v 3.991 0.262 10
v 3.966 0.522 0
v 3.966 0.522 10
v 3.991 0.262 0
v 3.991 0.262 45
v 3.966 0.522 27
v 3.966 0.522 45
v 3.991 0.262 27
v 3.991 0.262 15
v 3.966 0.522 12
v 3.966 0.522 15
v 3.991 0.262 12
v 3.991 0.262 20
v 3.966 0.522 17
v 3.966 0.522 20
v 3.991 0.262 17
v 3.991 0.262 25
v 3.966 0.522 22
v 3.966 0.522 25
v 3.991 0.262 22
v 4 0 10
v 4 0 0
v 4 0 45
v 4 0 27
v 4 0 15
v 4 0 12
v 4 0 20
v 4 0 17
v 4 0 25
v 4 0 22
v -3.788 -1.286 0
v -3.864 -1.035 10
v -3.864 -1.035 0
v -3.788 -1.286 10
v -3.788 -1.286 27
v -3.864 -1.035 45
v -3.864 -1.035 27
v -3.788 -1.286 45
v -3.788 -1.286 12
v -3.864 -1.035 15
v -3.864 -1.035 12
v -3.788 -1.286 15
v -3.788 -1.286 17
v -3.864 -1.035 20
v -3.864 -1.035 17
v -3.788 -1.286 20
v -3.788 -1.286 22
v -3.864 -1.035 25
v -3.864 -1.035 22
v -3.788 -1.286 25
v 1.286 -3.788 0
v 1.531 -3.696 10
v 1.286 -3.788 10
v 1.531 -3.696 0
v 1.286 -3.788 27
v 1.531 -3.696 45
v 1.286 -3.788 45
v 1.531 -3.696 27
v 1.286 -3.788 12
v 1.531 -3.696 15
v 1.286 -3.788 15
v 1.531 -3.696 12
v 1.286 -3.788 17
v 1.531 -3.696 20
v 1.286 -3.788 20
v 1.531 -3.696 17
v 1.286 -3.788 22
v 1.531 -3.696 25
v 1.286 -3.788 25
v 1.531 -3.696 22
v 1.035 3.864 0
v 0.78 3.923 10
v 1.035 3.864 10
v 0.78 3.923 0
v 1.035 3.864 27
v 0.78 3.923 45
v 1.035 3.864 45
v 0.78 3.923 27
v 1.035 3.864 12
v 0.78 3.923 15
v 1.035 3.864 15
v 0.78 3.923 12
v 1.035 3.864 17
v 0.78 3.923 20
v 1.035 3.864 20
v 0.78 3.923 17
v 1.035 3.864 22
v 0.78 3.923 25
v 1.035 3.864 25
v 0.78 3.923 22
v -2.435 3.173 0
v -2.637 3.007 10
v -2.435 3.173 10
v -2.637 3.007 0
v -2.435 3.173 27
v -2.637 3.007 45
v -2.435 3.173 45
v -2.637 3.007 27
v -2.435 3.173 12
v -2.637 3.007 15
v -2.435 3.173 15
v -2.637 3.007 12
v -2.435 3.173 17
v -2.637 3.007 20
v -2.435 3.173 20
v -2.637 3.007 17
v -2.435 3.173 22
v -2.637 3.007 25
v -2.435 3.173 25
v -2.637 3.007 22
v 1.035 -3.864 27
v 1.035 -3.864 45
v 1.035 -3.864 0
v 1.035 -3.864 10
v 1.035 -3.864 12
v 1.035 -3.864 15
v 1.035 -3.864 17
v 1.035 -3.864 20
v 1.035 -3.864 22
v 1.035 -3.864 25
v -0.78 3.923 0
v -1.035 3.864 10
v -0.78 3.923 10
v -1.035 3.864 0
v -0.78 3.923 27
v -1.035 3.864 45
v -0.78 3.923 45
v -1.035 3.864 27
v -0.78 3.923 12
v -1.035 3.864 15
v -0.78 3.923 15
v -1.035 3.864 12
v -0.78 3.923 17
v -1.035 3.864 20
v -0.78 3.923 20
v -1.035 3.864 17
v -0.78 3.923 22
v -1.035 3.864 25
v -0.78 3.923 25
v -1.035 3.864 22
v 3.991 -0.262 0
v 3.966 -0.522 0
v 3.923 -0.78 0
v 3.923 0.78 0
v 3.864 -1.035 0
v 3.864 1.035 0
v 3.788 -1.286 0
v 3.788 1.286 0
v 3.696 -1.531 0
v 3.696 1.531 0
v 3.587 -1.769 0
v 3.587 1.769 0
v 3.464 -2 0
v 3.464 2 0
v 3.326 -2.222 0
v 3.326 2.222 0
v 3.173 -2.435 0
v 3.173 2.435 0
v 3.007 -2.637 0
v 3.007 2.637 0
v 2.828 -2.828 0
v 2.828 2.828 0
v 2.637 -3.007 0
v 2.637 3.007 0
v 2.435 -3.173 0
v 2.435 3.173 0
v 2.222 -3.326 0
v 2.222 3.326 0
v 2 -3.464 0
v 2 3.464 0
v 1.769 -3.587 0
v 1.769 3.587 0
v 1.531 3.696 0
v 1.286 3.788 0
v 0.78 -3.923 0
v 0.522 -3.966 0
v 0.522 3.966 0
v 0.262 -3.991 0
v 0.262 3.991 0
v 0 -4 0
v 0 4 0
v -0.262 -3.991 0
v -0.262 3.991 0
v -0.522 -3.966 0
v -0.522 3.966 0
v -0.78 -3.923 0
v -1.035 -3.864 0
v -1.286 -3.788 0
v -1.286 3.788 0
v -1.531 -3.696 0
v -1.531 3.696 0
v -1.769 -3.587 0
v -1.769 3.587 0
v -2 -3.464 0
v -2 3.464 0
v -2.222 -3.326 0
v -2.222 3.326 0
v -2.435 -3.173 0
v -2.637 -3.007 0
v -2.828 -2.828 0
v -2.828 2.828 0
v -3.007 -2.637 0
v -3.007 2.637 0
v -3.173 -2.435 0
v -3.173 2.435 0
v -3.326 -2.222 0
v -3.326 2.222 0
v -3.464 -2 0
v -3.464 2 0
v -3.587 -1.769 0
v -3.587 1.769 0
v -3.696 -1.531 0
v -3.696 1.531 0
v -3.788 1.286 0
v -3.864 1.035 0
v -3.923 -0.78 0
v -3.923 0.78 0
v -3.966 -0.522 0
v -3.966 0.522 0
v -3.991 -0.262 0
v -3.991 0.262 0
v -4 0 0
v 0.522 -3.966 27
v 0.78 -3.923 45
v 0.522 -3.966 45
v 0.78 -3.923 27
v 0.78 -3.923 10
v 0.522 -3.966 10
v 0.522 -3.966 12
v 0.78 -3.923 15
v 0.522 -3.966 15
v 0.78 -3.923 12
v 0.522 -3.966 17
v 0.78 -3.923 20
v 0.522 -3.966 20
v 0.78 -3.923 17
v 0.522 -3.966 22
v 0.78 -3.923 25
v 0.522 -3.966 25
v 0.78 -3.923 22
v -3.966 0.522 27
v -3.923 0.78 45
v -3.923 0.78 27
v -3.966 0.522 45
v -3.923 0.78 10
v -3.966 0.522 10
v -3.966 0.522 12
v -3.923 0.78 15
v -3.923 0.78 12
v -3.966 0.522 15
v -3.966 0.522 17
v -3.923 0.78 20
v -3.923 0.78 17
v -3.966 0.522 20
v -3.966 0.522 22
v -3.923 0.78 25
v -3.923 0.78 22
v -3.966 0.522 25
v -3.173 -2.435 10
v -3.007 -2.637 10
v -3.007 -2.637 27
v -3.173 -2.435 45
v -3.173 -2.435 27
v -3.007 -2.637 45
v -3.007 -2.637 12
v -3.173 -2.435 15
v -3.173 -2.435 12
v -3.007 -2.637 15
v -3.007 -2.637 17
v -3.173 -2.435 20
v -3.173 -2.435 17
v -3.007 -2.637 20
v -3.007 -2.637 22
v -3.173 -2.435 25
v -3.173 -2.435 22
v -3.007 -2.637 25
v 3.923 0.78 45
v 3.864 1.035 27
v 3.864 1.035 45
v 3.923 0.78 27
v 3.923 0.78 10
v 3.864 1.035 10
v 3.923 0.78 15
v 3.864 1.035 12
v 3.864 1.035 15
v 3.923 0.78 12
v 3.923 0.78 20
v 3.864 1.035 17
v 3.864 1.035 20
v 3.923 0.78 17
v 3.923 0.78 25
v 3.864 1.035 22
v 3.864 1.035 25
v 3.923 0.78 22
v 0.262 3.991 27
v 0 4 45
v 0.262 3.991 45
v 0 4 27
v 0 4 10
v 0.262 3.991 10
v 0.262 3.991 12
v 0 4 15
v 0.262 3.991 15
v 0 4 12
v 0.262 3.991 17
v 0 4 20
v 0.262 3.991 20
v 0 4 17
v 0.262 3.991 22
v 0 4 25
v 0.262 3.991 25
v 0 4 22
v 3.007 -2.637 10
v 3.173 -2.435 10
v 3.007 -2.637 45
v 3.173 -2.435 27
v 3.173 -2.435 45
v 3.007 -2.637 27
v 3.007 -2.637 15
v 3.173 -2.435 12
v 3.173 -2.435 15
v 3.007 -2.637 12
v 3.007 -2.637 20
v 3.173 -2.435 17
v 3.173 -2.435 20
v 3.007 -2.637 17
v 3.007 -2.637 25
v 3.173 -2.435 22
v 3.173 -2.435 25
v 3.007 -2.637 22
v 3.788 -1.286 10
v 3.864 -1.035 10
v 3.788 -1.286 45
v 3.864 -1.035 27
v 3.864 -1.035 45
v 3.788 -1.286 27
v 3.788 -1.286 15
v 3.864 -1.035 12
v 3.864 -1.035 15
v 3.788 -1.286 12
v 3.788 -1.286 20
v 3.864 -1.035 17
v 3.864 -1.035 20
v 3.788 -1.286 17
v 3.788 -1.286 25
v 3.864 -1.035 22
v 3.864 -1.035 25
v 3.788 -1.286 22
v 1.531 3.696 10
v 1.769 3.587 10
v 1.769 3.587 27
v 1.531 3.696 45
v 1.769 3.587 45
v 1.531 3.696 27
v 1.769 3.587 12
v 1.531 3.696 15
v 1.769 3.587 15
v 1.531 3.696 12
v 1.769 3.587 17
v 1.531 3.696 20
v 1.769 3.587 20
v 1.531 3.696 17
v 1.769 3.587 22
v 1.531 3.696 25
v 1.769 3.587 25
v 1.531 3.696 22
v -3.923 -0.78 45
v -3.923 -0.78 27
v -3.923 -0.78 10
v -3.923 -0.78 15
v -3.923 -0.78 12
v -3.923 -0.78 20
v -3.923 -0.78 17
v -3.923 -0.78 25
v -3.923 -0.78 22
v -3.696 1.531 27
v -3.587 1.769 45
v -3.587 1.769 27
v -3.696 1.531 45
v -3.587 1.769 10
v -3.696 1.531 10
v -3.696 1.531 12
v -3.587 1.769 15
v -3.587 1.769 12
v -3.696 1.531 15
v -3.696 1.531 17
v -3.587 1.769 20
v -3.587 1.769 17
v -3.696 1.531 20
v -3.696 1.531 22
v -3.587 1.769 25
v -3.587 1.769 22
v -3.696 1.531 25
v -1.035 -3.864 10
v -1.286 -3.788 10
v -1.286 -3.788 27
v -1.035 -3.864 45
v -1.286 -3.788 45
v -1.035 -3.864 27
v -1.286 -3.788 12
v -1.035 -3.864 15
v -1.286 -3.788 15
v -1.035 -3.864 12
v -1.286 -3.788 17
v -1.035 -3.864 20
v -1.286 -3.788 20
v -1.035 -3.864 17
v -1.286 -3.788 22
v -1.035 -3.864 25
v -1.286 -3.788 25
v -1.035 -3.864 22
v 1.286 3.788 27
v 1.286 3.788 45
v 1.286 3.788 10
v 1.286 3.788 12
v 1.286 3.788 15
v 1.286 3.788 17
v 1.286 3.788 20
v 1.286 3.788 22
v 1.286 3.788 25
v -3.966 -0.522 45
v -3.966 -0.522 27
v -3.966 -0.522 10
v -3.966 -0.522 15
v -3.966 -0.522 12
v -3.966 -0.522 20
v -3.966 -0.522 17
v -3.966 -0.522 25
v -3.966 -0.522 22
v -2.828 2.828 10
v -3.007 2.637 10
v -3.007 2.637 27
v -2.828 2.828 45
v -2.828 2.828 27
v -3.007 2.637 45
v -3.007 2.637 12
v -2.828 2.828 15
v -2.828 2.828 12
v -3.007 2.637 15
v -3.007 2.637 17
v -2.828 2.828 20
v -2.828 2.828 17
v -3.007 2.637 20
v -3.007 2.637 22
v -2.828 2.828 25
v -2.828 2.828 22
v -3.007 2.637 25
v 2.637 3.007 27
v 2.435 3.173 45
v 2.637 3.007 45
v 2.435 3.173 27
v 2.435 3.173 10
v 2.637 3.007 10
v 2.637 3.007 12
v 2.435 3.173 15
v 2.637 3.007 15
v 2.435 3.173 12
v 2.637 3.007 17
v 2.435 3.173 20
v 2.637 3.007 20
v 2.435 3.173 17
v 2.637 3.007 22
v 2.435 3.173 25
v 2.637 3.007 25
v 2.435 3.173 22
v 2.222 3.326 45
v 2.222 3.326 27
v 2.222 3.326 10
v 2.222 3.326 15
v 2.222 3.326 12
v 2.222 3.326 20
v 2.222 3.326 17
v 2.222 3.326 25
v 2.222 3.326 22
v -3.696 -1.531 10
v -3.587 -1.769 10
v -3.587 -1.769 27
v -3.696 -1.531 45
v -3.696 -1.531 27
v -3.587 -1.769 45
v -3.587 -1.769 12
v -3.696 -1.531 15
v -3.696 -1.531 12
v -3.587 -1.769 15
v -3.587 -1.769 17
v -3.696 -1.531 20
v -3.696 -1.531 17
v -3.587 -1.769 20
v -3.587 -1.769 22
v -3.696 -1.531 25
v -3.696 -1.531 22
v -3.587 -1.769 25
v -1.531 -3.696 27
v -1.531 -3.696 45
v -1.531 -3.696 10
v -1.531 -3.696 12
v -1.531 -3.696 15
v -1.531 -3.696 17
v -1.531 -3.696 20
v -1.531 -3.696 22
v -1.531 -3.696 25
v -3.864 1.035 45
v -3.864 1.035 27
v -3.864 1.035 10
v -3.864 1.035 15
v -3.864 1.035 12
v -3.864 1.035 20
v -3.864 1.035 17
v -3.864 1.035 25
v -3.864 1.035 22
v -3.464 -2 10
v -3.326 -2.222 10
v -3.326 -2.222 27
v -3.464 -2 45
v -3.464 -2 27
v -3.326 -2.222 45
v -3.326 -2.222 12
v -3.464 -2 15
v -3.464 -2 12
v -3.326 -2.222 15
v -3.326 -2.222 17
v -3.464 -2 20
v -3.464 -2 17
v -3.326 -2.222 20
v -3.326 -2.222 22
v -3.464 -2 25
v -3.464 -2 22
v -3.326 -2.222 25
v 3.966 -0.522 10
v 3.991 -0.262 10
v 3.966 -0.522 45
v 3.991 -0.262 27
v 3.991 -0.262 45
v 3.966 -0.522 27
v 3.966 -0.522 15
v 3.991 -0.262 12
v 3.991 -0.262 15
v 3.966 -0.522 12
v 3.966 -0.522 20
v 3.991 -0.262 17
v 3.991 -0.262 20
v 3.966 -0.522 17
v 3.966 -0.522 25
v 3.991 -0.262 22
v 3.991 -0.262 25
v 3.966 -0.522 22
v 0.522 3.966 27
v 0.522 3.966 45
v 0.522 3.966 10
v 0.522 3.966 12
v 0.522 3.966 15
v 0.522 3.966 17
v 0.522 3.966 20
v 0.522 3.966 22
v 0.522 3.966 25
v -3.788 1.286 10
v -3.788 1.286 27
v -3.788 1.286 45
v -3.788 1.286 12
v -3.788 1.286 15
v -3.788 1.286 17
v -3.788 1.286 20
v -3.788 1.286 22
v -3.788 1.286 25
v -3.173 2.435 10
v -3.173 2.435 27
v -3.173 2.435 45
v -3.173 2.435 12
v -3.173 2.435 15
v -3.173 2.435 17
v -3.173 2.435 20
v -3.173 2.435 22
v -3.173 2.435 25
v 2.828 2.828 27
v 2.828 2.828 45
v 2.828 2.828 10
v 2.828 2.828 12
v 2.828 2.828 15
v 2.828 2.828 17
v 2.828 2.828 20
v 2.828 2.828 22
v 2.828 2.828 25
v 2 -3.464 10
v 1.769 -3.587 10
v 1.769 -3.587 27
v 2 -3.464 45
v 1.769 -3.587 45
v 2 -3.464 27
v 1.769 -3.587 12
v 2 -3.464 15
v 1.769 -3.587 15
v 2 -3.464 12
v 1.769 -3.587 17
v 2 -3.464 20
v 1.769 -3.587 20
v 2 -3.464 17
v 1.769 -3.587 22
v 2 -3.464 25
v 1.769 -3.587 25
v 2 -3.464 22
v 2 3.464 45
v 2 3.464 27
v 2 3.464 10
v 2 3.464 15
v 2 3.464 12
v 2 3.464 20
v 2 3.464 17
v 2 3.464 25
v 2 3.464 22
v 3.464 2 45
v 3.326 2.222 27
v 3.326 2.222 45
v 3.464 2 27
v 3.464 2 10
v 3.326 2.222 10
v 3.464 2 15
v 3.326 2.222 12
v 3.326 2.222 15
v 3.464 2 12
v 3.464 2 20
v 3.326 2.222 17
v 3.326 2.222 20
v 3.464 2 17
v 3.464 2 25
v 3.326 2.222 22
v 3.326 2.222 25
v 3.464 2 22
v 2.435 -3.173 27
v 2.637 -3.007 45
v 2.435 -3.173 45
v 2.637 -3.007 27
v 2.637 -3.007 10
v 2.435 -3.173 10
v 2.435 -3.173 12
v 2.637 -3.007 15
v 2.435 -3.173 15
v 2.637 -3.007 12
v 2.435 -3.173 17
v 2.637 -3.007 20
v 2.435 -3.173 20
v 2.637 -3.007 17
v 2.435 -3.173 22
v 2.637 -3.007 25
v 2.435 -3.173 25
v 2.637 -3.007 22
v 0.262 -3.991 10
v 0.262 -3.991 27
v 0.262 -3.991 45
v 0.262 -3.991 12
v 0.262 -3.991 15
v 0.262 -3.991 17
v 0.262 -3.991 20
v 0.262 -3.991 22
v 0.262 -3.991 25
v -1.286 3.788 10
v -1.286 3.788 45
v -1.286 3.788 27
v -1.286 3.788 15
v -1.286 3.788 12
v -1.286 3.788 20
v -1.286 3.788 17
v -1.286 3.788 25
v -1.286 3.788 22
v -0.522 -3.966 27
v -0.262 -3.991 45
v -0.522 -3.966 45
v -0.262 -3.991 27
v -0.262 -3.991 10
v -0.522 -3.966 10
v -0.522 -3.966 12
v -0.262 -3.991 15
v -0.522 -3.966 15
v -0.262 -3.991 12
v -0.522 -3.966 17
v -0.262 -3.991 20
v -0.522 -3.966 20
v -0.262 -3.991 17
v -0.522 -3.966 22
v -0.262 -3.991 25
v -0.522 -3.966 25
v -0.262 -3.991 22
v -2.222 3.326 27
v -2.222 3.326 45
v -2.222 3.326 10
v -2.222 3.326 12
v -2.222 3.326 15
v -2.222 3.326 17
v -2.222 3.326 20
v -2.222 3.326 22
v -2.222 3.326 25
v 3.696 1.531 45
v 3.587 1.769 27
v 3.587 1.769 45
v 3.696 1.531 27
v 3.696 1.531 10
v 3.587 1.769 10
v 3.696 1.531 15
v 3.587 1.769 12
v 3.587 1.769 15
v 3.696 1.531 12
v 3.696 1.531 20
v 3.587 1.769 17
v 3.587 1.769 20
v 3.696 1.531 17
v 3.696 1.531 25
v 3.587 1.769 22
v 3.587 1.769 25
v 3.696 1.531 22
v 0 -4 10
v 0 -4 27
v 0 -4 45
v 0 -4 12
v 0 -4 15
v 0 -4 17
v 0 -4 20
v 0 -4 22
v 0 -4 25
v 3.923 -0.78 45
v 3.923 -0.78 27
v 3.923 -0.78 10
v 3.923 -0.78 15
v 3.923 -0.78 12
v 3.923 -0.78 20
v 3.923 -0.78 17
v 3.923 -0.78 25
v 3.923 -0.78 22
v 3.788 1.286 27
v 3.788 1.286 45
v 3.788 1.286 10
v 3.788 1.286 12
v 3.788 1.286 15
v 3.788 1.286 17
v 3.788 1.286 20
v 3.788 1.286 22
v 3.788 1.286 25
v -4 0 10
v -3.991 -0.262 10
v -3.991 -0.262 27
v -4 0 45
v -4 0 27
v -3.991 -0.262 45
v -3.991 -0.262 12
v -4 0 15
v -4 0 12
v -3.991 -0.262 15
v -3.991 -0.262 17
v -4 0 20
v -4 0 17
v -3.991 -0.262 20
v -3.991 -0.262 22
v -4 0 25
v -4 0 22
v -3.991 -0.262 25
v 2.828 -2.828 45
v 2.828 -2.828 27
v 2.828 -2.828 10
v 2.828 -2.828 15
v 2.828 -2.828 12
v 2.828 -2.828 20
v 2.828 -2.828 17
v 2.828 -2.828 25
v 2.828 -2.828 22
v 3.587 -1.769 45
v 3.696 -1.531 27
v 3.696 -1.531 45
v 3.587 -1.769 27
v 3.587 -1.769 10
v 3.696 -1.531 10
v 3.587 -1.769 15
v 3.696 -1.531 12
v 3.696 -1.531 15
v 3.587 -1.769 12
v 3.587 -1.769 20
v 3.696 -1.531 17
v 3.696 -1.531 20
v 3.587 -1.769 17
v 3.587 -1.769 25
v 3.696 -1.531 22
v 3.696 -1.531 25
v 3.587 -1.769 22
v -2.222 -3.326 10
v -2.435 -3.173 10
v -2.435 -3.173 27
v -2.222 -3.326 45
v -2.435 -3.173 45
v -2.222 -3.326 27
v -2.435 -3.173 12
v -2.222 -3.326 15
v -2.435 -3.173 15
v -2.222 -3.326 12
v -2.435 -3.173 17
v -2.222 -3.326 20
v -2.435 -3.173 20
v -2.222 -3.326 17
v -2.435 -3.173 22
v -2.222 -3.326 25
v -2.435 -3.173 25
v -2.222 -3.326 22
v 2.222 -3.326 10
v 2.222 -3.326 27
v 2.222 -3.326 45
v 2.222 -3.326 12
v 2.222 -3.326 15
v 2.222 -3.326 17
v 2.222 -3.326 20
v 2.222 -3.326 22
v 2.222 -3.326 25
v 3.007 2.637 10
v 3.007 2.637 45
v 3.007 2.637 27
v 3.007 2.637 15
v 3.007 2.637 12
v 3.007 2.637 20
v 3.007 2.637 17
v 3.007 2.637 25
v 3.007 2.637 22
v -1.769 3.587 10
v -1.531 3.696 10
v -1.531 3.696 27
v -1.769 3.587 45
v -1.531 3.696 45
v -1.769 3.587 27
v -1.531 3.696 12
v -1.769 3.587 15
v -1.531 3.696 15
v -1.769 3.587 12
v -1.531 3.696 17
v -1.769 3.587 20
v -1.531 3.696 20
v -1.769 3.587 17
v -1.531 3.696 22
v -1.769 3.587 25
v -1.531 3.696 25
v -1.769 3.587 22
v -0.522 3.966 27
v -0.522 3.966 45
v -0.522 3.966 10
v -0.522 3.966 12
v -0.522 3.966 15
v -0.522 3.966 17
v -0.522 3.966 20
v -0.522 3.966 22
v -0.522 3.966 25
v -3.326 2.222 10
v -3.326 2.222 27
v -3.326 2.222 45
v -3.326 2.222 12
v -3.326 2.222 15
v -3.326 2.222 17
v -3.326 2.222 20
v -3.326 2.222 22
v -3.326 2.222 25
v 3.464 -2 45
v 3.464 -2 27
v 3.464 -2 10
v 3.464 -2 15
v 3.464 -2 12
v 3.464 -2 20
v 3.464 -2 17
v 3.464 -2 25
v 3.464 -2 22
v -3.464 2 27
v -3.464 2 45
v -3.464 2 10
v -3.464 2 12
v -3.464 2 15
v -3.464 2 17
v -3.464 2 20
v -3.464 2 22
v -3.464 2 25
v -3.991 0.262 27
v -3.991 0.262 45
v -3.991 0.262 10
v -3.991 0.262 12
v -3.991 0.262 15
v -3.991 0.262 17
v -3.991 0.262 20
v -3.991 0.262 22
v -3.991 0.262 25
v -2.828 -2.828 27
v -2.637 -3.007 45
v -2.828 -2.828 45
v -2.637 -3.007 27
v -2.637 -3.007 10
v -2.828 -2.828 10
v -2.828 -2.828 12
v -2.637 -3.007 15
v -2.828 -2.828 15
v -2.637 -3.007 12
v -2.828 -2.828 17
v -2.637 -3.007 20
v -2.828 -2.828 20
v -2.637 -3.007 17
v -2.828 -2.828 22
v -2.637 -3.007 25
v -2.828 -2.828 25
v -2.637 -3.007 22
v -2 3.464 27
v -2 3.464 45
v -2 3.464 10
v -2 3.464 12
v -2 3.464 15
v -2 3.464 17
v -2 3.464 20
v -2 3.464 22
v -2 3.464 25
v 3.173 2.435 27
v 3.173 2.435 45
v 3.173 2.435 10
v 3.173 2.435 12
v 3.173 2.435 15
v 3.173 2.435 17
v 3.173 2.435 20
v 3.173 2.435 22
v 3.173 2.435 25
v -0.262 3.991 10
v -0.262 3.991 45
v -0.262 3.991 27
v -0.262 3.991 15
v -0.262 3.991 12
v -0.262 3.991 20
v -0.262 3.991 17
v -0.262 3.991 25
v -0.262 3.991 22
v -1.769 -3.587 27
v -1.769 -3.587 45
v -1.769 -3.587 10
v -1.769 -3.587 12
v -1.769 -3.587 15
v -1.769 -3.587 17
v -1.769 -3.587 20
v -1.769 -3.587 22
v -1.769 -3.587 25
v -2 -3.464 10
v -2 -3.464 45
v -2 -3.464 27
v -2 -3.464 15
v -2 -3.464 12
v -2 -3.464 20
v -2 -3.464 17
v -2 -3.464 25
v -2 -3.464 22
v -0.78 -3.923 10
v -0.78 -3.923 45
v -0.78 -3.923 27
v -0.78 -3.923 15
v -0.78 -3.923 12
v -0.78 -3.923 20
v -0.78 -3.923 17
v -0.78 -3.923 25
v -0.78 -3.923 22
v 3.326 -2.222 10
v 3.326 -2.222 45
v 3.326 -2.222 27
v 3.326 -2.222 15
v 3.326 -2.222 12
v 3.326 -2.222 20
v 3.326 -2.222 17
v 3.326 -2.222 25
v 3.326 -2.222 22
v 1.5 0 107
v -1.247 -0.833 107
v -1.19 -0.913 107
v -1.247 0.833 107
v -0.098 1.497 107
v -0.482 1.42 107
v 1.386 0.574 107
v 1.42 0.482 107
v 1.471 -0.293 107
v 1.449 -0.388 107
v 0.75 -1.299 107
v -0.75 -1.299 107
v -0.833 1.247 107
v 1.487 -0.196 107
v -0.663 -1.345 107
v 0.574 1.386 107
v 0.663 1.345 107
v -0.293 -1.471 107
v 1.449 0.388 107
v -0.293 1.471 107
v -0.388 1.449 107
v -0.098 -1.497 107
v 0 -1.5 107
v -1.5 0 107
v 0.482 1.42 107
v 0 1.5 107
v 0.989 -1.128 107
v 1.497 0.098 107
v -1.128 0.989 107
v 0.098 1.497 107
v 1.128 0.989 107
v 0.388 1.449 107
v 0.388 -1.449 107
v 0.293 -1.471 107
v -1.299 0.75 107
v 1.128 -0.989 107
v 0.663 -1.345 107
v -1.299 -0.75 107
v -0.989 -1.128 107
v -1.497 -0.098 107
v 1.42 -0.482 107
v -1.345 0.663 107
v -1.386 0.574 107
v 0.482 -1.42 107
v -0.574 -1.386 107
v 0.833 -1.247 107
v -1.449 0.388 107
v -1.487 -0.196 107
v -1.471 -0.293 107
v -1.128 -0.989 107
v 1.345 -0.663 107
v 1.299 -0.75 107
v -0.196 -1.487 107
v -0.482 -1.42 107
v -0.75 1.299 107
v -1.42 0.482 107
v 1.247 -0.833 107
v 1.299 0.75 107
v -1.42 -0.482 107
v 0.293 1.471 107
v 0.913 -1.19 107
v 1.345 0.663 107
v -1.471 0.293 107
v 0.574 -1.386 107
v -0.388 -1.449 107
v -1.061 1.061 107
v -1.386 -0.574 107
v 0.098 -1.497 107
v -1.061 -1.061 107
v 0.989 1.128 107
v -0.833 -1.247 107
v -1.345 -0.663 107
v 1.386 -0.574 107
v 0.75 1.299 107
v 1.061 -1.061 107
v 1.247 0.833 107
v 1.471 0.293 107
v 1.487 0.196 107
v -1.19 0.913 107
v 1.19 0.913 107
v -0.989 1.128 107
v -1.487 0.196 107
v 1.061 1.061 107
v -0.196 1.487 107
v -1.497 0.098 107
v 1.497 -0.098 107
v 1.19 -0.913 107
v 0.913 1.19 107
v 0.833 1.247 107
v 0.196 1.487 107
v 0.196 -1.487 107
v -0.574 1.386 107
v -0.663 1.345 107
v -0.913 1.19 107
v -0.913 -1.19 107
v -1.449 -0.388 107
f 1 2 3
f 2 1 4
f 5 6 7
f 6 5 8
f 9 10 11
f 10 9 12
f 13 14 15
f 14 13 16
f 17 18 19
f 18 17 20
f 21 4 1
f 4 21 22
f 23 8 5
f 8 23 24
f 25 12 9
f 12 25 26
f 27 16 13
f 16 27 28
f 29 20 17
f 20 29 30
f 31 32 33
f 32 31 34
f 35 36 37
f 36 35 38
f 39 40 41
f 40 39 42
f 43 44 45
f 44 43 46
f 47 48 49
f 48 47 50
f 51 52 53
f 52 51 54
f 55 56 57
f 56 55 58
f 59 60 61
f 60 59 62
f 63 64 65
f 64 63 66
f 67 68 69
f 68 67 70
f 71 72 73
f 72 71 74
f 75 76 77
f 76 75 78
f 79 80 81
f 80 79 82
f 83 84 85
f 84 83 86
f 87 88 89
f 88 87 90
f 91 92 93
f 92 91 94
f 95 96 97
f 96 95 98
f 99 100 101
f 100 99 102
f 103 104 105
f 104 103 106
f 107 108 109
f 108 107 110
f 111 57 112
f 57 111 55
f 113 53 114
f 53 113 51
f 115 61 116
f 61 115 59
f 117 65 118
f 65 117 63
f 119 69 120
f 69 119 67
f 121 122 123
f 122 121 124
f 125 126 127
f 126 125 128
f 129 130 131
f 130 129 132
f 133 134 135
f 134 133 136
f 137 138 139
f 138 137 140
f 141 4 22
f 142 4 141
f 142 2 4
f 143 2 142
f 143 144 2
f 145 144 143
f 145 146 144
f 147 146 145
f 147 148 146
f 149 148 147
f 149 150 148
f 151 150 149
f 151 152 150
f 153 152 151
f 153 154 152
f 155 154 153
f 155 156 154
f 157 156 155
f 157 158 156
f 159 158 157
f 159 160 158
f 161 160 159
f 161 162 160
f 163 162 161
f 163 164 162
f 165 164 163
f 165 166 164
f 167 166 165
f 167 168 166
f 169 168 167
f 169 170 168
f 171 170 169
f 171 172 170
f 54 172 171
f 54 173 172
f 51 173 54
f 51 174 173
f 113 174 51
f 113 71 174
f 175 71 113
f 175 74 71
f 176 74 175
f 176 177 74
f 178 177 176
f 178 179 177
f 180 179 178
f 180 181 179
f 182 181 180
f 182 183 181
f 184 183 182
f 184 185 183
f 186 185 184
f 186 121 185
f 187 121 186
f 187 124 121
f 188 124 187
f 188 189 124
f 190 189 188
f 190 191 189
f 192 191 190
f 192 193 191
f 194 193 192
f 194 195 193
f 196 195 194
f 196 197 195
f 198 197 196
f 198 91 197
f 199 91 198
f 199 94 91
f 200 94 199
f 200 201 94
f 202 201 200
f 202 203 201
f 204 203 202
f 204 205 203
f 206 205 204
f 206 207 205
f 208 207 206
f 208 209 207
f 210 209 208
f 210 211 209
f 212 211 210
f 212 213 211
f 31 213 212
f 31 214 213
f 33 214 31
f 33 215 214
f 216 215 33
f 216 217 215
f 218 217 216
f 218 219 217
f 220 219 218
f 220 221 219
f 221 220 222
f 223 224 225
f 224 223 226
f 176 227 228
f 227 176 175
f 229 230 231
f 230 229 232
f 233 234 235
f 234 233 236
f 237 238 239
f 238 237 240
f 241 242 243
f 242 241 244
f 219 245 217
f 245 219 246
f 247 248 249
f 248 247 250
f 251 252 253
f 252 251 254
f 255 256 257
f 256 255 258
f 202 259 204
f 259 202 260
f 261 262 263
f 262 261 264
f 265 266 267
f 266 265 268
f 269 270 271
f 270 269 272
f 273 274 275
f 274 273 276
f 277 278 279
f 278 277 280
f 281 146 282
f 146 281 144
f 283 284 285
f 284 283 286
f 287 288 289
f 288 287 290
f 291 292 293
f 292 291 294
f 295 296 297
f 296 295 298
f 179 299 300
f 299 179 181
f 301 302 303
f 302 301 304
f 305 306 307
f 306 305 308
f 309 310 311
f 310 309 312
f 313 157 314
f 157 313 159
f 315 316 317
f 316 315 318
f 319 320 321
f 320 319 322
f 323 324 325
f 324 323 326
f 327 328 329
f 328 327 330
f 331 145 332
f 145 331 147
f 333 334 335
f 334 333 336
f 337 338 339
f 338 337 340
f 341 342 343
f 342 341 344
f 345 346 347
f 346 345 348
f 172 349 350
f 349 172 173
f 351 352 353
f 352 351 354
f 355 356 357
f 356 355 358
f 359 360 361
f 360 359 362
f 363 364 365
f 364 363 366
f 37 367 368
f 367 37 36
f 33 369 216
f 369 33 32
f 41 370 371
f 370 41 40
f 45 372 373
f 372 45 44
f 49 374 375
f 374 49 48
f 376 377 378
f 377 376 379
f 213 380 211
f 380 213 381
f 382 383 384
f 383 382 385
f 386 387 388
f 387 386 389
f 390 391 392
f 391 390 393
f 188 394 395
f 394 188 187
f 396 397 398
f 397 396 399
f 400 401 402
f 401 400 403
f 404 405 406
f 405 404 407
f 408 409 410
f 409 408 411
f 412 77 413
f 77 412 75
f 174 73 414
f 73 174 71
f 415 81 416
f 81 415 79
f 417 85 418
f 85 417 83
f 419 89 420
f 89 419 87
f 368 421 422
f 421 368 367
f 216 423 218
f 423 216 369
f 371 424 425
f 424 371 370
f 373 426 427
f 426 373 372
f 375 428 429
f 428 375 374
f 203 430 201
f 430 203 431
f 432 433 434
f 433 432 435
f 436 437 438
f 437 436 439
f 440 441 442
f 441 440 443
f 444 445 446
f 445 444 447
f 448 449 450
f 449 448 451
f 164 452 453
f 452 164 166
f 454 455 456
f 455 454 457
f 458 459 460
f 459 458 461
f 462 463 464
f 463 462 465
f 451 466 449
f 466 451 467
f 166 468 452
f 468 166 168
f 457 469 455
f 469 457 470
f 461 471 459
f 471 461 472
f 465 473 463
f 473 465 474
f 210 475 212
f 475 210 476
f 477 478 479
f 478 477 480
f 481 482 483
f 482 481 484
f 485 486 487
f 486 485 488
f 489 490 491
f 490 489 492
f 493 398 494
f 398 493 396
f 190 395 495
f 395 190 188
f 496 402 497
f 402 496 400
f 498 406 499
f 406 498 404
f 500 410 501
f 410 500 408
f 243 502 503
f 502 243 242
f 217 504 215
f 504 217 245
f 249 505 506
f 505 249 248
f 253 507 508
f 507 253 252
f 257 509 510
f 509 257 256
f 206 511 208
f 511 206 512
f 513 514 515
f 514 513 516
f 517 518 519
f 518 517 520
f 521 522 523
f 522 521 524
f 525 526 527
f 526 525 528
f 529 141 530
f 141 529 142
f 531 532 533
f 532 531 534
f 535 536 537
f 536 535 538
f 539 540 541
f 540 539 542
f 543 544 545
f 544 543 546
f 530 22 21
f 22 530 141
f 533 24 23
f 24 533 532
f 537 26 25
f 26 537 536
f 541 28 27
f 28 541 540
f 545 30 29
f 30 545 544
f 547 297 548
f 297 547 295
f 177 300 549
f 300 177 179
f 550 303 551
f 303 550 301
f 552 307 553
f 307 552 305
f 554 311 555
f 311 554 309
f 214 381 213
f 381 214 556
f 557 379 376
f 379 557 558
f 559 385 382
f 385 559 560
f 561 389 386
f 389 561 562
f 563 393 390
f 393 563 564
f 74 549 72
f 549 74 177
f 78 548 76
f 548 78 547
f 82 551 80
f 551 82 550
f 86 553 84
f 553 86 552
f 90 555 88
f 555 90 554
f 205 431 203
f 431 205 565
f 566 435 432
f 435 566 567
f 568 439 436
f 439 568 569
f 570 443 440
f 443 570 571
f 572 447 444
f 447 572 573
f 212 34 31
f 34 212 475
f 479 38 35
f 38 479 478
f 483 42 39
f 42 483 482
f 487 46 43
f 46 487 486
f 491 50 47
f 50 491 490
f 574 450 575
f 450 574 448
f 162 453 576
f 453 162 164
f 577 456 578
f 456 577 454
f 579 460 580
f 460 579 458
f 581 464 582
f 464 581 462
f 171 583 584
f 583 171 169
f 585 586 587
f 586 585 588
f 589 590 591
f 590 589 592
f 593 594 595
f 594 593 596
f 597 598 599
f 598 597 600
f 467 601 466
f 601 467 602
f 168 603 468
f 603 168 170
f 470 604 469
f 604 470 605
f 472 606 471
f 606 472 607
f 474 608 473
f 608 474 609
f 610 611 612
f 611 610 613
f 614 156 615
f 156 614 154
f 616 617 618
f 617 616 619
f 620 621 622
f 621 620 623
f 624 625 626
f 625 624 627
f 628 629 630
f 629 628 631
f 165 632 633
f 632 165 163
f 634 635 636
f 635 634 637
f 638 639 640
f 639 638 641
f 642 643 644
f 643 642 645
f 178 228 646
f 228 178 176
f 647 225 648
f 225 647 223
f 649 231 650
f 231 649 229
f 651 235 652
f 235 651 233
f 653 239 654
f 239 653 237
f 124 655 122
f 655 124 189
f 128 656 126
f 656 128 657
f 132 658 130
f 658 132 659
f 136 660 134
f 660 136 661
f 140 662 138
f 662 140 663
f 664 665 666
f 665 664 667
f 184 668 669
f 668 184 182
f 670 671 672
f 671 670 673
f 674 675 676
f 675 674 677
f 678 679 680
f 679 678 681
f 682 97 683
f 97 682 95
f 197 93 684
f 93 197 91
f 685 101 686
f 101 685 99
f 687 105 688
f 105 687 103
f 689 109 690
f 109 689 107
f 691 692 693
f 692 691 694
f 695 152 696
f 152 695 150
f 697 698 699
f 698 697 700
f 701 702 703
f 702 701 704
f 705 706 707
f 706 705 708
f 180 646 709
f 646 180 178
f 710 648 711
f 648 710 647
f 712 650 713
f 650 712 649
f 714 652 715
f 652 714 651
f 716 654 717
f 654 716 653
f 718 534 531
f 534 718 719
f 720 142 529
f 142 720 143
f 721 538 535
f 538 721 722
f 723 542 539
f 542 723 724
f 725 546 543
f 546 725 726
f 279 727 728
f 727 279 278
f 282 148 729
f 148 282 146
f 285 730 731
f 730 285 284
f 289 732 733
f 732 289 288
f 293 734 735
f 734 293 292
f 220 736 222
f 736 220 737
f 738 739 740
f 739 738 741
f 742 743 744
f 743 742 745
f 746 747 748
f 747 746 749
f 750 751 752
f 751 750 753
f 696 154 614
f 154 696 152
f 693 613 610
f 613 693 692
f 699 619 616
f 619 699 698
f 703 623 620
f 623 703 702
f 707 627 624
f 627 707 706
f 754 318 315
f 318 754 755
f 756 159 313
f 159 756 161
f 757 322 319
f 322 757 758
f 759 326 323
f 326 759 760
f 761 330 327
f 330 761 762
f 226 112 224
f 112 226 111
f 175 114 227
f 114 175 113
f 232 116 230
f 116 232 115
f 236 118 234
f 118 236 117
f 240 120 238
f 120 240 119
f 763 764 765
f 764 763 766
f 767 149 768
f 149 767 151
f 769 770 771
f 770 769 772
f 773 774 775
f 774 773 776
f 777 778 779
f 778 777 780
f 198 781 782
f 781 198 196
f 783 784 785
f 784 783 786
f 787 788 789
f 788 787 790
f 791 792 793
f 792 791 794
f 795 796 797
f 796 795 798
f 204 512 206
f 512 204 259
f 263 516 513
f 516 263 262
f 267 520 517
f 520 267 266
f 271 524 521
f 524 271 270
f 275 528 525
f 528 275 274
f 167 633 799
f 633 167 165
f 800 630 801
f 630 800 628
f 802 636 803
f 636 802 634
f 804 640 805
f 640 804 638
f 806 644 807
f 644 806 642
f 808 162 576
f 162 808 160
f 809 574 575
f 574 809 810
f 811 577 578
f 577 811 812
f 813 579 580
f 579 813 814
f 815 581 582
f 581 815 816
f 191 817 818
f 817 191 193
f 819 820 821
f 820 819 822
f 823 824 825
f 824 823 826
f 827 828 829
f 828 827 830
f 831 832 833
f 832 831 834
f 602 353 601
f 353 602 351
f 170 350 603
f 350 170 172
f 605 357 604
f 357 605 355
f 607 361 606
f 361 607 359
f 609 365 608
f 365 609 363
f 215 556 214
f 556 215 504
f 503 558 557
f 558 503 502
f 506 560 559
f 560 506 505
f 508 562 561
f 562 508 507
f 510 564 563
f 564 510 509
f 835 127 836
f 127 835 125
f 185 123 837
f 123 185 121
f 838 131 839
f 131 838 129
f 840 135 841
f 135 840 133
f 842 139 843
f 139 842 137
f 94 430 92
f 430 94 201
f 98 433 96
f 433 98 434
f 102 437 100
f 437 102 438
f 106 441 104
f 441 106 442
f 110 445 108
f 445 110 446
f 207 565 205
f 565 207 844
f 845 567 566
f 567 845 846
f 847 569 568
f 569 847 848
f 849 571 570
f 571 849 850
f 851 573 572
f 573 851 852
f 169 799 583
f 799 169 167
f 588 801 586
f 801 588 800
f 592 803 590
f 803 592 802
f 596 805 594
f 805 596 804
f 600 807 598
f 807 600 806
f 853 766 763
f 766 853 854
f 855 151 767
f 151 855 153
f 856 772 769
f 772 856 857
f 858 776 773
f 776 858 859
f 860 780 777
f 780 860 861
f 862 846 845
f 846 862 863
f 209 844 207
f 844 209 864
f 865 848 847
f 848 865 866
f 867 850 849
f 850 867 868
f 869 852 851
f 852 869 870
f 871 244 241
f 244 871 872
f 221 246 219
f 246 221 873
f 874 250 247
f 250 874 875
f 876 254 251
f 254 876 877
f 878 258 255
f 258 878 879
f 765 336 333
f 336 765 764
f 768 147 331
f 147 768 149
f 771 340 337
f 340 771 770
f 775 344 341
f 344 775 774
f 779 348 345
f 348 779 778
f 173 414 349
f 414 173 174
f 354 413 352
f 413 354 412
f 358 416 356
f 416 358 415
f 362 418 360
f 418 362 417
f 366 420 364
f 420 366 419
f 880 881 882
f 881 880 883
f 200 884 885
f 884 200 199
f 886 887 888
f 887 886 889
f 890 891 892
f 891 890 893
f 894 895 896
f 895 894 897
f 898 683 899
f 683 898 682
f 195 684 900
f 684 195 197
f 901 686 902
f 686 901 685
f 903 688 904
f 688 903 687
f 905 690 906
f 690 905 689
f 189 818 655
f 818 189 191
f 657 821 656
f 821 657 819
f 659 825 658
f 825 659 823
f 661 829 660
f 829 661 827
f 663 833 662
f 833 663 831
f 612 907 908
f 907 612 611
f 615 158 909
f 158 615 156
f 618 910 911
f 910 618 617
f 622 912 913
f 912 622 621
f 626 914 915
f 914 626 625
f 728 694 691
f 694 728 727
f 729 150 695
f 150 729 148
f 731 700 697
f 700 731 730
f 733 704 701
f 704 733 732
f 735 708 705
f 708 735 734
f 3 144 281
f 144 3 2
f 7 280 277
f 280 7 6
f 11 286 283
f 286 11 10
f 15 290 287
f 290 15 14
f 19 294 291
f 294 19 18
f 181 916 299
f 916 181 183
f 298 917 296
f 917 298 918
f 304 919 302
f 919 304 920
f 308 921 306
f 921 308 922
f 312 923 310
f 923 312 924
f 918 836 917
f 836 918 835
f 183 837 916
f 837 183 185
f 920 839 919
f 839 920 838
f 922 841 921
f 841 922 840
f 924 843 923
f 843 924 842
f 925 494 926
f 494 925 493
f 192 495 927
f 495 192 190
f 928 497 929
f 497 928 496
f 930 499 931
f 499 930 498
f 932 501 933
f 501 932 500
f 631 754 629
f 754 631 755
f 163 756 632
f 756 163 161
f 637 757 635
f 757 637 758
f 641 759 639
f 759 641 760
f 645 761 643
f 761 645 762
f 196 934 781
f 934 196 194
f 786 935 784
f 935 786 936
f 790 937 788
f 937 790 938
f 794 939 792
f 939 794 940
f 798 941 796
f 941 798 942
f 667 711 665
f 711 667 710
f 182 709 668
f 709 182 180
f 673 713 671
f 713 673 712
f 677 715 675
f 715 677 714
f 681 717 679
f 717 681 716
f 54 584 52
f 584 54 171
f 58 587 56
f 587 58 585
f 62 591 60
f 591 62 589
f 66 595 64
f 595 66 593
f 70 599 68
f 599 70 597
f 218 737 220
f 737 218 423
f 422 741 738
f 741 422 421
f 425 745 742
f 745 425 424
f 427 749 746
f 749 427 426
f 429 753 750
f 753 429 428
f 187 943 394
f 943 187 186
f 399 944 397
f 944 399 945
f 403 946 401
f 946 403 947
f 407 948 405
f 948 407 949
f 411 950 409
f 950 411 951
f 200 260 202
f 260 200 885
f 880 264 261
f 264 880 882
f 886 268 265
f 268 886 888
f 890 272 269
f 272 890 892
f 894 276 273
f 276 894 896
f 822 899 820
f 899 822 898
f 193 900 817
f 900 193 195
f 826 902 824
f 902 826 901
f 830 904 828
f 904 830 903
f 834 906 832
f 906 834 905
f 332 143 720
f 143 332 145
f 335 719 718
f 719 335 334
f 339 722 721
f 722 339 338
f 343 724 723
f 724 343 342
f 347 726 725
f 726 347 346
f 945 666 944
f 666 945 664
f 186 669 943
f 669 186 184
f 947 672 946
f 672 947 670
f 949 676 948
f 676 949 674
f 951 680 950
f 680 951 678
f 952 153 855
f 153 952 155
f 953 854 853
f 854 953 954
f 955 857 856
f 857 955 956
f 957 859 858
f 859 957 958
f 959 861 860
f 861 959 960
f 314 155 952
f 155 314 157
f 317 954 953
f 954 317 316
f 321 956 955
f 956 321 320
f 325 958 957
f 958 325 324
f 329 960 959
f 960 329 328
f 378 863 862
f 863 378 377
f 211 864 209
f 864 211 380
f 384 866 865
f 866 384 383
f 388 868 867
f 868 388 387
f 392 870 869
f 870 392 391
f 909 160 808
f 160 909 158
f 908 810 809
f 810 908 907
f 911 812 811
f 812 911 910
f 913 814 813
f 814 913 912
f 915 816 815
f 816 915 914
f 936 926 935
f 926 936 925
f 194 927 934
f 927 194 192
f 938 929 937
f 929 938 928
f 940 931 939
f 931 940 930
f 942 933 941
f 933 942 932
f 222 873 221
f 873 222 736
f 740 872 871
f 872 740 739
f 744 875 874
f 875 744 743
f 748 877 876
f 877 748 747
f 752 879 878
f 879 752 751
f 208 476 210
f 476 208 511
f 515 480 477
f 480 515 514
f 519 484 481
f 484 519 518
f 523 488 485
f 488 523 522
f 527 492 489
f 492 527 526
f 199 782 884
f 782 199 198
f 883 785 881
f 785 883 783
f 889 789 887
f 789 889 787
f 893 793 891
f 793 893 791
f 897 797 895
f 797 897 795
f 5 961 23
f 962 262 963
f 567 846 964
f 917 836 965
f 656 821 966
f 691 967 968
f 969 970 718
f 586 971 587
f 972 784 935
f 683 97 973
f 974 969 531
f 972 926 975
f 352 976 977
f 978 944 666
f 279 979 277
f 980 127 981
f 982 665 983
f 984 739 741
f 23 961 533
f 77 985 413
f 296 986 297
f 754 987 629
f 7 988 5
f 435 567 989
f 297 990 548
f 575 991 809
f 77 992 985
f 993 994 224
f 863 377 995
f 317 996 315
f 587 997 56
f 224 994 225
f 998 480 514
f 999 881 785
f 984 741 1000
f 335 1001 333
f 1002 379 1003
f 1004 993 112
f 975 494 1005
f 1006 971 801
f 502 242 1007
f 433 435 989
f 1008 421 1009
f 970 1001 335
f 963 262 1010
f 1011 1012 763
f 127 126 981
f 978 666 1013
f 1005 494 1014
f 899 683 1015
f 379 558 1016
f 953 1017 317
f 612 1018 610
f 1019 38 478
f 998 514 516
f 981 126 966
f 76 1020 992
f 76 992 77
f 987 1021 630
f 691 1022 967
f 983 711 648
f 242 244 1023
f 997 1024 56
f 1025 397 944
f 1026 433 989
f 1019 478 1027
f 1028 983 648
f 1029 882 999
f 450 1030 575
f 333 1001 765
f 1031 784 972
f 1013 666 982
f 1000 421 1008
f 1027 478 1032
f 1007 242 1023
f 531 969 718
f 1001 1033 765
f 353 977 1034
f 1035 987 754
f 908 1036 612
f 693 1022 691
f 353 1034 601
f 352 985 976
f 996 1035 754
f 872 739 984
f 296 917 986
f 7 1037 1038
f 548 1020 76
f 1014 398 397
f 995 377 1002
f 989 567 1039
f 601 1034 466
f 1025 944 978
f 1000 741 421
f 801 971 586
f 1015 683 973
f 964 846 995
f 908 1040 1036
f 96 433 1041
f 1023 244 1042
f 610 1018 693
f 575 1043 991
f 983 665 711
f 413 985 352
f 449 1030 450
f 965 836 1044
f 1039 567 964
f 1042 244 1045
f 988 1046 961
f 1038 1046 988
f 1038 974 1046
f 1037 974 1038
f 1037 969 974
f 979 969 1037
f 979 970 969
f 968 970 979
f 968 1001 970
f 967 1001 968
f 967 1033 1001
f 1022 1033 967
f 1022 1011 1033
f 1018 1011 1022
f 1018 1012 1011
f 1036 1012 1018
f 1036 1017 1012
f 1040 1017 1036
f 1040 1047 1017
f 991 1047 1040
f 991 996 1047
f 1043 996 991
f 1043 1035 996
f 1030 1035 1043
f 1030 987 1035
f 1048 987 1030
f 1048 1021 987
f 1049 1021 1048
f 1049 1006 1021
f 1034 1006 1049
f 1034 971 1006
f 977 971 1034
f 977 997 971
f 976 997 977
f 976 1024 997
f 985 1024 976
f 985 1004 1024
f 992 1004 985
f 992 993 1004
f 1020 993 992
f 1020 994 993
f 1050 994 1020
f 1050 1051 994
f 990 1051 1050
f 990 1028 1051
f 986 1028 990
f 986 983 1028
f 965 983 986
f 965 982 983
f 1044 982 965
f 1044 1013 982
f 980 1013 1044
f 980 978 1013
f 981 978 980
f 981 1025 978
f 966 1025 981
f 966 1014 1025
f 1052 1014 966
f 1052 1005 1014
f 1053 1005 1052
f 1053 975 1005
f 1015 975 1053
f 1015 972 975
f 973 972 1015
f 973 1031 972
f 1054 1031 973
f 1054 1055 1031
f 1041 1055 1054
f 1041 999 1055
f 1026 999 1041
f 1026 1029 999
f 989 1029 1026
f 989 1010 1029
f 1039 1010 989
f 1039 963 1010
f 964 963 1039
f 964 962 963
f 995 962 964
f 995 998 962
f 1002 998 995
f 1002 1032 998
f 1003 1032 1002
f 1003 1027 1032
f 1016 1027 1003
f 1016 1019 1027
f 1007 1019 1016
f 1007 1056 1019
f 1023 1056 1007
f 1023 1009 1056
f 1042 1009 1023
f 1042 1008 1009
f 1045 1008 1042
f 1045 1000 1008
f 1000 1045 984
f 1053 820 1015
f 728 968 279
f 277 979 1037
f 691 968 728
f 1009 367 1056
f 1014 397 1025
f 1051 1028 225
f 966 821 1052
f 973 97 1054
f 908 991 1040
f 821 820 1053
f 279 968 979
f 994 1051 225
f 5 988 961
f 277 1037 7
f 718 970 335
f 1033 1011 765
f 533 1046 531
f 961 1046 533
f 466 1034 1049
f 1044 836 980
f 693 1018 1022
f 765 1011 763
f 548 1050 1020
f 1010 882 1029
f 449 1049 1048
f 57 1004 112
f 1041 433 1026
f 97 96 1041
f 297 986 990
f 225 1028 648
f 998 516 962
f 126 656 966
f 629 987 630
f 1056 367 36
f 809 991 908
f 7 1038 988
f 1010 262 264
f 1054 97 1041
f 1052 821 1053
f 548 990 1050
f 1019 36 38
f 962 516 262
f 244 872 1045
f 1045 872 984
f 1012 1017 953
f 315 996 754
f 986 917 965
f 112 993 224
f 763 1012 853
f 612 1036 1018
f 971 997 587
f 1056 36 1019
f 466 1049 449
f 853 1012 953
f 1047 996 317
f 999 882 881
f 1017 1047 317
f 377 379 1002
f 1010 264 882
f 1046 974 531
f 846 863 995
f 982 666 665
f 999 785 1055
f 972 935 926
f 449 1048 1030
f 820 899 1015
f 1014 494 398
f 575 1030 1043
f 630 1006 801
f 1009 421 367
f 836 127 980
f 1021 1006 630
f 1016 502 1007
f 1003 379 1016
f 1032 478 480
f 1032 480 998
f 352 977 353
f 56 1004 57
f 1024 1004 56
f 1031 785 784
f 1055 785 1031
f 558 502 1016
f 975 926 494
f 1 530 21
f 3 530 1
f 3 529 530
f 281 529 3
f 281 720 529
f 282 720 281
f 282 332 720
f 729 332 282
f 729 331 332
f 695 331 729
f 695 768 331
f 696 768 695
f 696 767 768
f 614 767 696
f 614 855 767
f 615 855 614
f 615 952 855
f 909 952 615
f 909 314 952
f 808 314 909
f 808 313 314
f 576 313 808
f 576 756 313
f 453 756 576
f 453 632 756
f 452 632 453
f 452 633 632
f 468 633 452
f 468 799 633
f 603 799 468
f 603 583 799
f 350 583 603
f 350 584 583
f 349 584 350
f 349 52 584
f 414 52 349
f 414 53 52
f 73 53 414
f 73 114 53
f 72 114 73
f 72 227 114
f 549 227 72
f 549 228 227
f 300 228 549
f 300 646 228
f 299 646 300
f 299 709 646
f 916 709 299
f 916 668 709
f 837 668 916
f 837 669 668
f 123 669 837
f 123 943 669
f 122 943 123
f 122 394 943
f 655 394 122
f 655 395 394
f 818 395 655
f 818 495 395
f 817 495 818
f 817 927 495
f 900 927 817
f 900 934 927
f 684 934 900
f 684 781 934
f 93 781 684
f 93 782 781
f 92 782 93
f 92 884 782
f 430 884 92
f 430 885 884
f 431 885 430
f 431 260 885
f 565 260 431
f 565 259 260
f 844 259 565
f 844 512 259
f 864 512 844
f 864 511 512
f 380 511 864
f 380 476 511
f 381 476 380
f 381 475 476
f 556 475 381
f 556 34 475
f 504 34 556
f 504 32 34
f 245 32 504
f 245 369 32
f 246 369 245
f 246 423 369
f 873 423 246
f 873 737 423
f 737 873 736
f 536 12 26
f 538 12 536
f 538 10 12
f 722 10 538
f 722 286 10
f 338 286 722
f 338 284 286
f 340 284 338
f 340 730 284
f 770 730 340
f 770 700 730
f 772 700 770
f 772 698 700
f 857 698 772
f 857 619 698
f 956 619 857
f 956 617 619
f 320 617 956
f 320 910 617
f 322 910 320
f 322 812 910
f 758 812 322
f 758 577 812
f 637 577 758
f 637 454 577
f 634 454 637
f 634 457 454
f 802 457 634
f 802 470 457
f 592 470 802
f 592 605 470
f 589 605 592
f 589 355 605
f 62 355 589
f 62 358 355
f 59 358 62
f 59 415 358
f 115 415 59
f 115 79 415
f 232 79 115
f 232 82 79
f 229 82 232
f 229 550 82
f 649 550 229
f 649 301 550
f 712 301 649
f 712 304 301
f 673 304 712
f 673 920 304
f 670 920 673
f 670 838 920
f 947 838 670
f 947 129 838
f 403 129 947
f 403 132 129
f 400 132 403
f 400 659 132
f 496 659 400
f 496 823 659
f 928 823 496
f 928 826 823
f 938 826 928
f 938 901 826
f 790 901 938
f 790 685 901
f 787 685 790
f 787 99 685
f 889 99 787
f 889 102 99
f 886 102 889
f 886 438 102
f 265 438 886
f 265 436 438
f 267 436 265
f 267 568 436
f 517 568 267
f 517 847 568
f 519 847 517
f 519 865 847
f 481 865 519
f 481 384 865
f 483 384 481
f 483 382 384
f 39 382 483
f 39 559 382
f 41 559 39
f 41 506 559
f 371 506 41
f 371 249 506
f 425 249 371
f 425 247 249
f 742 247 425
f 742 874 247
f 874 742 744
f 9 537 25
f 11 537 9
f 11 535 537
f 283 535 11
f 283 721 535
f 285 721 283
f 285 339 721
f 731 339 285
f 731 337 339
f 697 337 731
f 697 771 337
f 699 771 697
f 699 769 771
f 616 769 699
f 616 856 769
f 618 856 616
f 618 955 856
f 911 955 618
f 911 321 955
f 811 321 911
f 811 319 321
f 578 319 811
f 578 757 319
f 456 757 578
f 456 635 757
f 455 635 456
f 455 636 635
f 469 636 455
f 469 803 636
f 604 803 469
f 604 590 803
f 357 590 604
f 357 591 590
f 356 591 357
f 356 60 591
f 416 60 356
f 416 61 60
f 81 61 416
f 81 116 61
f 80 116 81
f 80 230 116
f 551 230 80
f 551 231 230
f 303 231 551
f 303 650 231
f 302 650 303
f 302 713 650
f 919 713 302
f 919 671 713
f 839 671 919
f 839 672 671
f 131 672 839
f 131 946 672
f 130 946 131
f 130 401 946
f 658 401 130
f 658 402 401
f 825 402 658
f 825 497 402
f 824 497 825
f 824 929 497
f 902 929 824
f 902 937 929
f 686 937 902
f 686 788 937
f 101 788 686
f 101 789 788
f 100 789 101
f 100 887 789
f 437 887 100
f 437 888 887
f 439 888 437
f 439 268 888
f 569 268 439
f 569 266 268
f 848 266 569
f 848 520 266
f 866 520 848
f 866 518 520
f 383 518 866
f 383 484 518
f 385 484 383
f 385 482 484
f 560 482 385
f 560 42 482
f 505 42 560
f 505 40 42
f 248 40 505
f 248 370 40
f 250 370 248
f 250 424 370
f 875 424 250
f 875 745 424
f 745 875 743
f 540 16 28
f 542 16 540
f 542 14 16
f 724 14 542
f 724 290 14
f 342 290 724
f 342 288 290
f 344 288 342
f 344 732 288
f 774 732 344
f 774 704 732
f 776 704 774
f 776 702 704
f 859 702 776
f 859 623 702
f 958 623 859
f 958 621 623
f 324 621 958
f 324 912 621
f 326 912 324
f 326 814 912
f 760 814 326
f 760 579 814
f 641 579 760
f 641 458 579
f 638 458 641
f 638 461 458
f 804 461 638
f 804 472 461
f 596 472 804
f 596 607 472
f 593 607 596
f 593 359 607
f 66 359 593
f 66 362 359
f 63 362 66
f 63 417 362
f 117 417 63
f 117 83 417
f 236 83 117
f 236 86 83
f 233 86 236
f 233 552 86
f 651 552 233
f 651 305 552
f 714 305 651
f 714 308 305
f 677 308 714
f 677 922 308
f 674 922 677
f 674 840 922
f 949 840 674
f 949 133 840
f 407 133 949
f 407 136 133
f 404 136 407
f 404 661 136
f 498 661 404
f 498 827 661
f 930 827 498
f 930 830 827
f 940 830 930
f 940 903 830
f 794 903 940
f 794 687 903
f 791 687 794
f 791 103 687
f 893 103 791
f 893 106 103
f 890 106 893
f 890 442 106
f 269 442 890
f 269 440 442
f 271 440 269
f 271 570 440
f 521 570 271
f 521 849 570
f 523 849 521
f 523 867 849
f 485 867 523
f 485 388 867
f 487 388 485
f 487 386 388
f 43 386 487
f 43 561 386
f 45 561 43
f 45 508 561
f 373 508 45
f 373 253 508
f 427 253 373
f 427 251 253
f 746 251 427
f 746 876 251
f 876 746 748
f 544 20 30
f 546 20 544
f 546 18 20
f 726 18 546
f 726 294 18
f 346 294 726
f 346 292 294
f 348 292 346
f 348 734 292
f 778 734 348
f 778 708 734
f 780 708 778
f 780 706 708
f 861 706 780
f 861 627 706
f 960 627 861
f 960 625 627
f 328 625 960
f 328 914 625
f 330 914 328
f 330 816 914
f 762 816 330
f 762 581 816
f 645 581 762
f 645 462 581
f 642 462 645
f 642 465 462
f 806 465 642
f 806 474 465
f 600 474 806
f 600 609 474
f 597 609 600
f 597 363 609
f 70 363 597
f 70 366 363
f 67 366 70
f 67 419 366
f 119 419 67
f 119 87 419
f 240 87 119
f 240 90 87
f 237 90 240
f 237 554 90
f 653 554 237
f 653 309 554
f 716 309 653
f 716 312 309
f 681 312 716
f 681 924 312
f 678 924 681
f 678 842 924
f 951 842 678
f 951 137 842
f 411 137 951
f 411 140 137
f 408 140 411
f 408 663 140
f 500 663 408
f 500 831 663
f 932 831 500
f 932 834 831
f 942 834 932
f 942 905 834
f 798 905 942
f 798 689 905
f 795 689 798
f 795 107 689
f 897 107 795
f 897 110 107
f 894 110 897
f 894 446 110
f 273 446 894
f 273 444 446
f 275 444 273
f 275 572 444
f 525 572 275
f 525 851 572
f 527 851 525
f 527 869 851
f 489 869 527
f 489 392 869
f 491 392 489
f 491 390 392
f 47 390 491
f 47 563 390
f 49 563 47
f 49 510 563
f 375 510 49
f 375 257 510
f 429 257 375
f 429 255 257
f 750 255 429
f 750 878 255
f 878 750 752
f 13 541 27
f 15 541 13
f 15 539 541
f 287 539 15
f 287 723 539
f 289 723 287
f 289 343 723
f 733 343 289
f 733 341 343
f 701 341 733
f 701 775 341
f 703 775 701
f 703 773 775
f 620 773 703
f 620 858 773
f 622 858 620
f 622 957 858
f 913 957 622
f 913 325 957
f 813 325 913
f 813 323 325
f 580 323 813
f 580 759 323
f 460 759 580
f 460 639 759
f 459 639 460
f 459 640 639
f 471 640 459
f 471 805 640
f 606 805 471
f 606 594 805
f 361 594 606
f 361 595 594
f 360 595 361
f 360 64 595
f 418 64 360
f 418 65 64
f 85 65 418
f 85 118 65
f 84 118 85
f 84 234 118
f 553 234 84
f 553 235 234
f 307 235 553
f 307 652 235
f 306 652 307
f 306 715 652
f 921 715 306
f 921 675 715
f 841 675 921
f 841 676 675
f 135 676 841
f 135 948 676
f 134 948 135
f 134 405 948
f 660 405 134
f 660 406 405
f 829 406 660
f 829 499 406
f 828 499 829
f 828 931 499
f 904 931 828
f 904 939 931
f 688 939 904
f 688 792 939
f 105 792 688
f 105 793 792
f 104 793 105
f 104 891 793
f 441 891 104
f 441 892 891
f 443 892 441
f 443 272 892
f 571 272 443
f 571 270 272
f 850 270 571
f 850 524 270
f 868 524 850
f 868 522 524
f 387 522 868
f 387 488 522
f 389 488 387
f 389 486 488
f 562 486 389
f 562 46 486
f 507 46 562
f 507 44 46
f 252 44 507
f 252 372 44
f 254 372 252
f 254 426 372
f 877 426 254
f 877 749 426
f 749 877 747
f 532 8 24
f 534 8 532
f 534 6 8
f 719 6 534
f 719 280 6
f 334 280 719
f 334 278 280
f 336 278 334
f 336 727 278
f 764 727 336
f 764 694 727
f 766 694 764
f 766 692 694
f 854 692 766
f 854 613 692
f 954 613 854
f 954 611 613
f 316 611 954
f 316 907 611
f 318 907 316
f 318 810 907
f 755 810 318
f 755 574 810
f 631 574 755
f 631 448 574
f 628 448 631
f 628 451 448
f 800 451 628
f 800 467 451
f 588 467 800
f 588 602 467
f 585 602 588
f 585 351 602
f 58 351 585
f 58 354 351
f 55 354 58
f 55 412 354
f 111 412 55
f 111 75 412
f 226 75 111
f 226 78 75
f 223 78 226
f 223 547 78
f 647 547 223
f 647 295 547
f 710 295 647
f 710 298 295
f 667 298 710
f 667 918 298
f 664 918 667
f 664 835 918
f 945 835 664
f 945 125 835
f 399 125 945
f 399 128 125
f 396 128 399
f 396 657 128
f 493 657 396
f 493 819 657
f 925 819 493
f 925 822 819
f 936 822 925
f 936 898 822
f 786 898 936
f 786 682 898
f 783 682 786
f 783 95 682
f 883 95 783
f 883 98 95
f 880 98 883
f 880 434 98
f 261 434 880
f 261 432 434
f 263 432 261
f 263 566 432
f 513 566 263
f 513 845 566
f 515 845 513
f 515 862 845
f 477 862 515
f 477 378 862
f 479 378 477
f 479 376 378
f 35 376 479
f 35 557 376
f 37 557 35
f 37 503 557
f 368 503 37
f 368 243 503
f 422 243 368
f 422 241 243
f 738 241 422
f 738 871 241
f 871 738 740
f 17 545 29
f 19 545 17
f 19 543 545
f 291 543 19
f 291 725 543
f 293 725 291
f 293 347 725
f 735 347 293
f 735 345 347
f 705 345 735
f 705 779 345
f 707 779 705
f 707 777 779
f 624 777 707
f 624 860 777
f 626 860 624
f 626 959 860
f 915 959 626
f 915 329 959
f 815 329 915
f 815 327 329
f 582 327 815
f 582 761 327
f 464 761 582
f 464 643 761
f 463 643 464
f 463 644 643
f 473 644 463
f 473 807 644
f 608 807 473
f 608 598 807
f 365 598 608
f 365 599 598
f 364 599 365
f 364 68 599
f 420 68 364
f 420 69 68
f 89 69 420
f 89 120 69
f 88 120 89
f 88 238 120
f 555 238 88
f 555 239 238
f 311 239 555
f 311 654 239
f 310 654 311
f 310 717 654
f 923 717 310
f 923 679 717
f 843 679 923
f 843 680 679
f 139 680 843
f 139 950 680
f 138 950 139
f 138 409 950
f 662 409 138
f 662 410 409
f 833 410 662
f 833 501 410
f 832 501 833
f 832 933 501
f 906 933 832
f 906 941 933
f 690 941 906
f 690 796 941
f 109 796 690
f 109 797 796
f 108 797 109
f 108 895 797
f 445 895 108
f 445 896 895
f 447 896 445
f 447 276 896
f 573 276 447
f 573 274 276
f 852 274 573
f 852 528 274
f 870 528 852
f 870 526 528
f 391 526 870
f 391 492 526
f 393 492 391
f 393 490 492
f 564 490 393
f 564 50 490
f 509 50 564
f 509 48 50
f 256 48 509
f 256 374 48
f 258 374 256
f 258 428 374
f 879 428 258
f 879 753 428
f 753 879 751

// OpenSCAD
// Pestle for grinding tissue inside a 1.5 mL microcentrifuge tube
// Print orientation: standing upright, handle at the bottom

// ---- Dimensions (mm) ----
handle_d        = 8;     // handle diameter
handle_top_z    = 45;    // top of handle / start of cone
cone_top_d      = 3;     // cone diameter at tip
sphere_d        = 3;     // tip sphere diameter
groove_w        = 2;     // groove width (Z)
groove_depth    = 1;     // groove depth (radial)
groove_centres  = [10, 15, 20, 25]; // groove centre heights
eps             = 0.5;   // cutter overshoot past faces

$fn = 96;

// ---- Model ----
difference() {
    union() {
        // Handle
        cylinder(d = handle_d, h = handle_top_z);
        // Cone (8 mm -> 3 mm over 45..62 mm)
        translate([0, 0, handle_top_z])
            cylinder(d1 = handle_d, d2 = cone_top_d, h = handle_top_z + 17);
        // Rounded tip: 3 mm sphere centred at z = 62
        translate([0, 0, handle_top_z + 17])
            sphere(d = sphere_d);
    }

    // Grip grooves, cut fully through the handle
    for (z = groove_centres)
        translate([0, 0, z])
            cylinder(d = handle_d + 2 * eps, h = groove_w, depth = groove_depth);
}
